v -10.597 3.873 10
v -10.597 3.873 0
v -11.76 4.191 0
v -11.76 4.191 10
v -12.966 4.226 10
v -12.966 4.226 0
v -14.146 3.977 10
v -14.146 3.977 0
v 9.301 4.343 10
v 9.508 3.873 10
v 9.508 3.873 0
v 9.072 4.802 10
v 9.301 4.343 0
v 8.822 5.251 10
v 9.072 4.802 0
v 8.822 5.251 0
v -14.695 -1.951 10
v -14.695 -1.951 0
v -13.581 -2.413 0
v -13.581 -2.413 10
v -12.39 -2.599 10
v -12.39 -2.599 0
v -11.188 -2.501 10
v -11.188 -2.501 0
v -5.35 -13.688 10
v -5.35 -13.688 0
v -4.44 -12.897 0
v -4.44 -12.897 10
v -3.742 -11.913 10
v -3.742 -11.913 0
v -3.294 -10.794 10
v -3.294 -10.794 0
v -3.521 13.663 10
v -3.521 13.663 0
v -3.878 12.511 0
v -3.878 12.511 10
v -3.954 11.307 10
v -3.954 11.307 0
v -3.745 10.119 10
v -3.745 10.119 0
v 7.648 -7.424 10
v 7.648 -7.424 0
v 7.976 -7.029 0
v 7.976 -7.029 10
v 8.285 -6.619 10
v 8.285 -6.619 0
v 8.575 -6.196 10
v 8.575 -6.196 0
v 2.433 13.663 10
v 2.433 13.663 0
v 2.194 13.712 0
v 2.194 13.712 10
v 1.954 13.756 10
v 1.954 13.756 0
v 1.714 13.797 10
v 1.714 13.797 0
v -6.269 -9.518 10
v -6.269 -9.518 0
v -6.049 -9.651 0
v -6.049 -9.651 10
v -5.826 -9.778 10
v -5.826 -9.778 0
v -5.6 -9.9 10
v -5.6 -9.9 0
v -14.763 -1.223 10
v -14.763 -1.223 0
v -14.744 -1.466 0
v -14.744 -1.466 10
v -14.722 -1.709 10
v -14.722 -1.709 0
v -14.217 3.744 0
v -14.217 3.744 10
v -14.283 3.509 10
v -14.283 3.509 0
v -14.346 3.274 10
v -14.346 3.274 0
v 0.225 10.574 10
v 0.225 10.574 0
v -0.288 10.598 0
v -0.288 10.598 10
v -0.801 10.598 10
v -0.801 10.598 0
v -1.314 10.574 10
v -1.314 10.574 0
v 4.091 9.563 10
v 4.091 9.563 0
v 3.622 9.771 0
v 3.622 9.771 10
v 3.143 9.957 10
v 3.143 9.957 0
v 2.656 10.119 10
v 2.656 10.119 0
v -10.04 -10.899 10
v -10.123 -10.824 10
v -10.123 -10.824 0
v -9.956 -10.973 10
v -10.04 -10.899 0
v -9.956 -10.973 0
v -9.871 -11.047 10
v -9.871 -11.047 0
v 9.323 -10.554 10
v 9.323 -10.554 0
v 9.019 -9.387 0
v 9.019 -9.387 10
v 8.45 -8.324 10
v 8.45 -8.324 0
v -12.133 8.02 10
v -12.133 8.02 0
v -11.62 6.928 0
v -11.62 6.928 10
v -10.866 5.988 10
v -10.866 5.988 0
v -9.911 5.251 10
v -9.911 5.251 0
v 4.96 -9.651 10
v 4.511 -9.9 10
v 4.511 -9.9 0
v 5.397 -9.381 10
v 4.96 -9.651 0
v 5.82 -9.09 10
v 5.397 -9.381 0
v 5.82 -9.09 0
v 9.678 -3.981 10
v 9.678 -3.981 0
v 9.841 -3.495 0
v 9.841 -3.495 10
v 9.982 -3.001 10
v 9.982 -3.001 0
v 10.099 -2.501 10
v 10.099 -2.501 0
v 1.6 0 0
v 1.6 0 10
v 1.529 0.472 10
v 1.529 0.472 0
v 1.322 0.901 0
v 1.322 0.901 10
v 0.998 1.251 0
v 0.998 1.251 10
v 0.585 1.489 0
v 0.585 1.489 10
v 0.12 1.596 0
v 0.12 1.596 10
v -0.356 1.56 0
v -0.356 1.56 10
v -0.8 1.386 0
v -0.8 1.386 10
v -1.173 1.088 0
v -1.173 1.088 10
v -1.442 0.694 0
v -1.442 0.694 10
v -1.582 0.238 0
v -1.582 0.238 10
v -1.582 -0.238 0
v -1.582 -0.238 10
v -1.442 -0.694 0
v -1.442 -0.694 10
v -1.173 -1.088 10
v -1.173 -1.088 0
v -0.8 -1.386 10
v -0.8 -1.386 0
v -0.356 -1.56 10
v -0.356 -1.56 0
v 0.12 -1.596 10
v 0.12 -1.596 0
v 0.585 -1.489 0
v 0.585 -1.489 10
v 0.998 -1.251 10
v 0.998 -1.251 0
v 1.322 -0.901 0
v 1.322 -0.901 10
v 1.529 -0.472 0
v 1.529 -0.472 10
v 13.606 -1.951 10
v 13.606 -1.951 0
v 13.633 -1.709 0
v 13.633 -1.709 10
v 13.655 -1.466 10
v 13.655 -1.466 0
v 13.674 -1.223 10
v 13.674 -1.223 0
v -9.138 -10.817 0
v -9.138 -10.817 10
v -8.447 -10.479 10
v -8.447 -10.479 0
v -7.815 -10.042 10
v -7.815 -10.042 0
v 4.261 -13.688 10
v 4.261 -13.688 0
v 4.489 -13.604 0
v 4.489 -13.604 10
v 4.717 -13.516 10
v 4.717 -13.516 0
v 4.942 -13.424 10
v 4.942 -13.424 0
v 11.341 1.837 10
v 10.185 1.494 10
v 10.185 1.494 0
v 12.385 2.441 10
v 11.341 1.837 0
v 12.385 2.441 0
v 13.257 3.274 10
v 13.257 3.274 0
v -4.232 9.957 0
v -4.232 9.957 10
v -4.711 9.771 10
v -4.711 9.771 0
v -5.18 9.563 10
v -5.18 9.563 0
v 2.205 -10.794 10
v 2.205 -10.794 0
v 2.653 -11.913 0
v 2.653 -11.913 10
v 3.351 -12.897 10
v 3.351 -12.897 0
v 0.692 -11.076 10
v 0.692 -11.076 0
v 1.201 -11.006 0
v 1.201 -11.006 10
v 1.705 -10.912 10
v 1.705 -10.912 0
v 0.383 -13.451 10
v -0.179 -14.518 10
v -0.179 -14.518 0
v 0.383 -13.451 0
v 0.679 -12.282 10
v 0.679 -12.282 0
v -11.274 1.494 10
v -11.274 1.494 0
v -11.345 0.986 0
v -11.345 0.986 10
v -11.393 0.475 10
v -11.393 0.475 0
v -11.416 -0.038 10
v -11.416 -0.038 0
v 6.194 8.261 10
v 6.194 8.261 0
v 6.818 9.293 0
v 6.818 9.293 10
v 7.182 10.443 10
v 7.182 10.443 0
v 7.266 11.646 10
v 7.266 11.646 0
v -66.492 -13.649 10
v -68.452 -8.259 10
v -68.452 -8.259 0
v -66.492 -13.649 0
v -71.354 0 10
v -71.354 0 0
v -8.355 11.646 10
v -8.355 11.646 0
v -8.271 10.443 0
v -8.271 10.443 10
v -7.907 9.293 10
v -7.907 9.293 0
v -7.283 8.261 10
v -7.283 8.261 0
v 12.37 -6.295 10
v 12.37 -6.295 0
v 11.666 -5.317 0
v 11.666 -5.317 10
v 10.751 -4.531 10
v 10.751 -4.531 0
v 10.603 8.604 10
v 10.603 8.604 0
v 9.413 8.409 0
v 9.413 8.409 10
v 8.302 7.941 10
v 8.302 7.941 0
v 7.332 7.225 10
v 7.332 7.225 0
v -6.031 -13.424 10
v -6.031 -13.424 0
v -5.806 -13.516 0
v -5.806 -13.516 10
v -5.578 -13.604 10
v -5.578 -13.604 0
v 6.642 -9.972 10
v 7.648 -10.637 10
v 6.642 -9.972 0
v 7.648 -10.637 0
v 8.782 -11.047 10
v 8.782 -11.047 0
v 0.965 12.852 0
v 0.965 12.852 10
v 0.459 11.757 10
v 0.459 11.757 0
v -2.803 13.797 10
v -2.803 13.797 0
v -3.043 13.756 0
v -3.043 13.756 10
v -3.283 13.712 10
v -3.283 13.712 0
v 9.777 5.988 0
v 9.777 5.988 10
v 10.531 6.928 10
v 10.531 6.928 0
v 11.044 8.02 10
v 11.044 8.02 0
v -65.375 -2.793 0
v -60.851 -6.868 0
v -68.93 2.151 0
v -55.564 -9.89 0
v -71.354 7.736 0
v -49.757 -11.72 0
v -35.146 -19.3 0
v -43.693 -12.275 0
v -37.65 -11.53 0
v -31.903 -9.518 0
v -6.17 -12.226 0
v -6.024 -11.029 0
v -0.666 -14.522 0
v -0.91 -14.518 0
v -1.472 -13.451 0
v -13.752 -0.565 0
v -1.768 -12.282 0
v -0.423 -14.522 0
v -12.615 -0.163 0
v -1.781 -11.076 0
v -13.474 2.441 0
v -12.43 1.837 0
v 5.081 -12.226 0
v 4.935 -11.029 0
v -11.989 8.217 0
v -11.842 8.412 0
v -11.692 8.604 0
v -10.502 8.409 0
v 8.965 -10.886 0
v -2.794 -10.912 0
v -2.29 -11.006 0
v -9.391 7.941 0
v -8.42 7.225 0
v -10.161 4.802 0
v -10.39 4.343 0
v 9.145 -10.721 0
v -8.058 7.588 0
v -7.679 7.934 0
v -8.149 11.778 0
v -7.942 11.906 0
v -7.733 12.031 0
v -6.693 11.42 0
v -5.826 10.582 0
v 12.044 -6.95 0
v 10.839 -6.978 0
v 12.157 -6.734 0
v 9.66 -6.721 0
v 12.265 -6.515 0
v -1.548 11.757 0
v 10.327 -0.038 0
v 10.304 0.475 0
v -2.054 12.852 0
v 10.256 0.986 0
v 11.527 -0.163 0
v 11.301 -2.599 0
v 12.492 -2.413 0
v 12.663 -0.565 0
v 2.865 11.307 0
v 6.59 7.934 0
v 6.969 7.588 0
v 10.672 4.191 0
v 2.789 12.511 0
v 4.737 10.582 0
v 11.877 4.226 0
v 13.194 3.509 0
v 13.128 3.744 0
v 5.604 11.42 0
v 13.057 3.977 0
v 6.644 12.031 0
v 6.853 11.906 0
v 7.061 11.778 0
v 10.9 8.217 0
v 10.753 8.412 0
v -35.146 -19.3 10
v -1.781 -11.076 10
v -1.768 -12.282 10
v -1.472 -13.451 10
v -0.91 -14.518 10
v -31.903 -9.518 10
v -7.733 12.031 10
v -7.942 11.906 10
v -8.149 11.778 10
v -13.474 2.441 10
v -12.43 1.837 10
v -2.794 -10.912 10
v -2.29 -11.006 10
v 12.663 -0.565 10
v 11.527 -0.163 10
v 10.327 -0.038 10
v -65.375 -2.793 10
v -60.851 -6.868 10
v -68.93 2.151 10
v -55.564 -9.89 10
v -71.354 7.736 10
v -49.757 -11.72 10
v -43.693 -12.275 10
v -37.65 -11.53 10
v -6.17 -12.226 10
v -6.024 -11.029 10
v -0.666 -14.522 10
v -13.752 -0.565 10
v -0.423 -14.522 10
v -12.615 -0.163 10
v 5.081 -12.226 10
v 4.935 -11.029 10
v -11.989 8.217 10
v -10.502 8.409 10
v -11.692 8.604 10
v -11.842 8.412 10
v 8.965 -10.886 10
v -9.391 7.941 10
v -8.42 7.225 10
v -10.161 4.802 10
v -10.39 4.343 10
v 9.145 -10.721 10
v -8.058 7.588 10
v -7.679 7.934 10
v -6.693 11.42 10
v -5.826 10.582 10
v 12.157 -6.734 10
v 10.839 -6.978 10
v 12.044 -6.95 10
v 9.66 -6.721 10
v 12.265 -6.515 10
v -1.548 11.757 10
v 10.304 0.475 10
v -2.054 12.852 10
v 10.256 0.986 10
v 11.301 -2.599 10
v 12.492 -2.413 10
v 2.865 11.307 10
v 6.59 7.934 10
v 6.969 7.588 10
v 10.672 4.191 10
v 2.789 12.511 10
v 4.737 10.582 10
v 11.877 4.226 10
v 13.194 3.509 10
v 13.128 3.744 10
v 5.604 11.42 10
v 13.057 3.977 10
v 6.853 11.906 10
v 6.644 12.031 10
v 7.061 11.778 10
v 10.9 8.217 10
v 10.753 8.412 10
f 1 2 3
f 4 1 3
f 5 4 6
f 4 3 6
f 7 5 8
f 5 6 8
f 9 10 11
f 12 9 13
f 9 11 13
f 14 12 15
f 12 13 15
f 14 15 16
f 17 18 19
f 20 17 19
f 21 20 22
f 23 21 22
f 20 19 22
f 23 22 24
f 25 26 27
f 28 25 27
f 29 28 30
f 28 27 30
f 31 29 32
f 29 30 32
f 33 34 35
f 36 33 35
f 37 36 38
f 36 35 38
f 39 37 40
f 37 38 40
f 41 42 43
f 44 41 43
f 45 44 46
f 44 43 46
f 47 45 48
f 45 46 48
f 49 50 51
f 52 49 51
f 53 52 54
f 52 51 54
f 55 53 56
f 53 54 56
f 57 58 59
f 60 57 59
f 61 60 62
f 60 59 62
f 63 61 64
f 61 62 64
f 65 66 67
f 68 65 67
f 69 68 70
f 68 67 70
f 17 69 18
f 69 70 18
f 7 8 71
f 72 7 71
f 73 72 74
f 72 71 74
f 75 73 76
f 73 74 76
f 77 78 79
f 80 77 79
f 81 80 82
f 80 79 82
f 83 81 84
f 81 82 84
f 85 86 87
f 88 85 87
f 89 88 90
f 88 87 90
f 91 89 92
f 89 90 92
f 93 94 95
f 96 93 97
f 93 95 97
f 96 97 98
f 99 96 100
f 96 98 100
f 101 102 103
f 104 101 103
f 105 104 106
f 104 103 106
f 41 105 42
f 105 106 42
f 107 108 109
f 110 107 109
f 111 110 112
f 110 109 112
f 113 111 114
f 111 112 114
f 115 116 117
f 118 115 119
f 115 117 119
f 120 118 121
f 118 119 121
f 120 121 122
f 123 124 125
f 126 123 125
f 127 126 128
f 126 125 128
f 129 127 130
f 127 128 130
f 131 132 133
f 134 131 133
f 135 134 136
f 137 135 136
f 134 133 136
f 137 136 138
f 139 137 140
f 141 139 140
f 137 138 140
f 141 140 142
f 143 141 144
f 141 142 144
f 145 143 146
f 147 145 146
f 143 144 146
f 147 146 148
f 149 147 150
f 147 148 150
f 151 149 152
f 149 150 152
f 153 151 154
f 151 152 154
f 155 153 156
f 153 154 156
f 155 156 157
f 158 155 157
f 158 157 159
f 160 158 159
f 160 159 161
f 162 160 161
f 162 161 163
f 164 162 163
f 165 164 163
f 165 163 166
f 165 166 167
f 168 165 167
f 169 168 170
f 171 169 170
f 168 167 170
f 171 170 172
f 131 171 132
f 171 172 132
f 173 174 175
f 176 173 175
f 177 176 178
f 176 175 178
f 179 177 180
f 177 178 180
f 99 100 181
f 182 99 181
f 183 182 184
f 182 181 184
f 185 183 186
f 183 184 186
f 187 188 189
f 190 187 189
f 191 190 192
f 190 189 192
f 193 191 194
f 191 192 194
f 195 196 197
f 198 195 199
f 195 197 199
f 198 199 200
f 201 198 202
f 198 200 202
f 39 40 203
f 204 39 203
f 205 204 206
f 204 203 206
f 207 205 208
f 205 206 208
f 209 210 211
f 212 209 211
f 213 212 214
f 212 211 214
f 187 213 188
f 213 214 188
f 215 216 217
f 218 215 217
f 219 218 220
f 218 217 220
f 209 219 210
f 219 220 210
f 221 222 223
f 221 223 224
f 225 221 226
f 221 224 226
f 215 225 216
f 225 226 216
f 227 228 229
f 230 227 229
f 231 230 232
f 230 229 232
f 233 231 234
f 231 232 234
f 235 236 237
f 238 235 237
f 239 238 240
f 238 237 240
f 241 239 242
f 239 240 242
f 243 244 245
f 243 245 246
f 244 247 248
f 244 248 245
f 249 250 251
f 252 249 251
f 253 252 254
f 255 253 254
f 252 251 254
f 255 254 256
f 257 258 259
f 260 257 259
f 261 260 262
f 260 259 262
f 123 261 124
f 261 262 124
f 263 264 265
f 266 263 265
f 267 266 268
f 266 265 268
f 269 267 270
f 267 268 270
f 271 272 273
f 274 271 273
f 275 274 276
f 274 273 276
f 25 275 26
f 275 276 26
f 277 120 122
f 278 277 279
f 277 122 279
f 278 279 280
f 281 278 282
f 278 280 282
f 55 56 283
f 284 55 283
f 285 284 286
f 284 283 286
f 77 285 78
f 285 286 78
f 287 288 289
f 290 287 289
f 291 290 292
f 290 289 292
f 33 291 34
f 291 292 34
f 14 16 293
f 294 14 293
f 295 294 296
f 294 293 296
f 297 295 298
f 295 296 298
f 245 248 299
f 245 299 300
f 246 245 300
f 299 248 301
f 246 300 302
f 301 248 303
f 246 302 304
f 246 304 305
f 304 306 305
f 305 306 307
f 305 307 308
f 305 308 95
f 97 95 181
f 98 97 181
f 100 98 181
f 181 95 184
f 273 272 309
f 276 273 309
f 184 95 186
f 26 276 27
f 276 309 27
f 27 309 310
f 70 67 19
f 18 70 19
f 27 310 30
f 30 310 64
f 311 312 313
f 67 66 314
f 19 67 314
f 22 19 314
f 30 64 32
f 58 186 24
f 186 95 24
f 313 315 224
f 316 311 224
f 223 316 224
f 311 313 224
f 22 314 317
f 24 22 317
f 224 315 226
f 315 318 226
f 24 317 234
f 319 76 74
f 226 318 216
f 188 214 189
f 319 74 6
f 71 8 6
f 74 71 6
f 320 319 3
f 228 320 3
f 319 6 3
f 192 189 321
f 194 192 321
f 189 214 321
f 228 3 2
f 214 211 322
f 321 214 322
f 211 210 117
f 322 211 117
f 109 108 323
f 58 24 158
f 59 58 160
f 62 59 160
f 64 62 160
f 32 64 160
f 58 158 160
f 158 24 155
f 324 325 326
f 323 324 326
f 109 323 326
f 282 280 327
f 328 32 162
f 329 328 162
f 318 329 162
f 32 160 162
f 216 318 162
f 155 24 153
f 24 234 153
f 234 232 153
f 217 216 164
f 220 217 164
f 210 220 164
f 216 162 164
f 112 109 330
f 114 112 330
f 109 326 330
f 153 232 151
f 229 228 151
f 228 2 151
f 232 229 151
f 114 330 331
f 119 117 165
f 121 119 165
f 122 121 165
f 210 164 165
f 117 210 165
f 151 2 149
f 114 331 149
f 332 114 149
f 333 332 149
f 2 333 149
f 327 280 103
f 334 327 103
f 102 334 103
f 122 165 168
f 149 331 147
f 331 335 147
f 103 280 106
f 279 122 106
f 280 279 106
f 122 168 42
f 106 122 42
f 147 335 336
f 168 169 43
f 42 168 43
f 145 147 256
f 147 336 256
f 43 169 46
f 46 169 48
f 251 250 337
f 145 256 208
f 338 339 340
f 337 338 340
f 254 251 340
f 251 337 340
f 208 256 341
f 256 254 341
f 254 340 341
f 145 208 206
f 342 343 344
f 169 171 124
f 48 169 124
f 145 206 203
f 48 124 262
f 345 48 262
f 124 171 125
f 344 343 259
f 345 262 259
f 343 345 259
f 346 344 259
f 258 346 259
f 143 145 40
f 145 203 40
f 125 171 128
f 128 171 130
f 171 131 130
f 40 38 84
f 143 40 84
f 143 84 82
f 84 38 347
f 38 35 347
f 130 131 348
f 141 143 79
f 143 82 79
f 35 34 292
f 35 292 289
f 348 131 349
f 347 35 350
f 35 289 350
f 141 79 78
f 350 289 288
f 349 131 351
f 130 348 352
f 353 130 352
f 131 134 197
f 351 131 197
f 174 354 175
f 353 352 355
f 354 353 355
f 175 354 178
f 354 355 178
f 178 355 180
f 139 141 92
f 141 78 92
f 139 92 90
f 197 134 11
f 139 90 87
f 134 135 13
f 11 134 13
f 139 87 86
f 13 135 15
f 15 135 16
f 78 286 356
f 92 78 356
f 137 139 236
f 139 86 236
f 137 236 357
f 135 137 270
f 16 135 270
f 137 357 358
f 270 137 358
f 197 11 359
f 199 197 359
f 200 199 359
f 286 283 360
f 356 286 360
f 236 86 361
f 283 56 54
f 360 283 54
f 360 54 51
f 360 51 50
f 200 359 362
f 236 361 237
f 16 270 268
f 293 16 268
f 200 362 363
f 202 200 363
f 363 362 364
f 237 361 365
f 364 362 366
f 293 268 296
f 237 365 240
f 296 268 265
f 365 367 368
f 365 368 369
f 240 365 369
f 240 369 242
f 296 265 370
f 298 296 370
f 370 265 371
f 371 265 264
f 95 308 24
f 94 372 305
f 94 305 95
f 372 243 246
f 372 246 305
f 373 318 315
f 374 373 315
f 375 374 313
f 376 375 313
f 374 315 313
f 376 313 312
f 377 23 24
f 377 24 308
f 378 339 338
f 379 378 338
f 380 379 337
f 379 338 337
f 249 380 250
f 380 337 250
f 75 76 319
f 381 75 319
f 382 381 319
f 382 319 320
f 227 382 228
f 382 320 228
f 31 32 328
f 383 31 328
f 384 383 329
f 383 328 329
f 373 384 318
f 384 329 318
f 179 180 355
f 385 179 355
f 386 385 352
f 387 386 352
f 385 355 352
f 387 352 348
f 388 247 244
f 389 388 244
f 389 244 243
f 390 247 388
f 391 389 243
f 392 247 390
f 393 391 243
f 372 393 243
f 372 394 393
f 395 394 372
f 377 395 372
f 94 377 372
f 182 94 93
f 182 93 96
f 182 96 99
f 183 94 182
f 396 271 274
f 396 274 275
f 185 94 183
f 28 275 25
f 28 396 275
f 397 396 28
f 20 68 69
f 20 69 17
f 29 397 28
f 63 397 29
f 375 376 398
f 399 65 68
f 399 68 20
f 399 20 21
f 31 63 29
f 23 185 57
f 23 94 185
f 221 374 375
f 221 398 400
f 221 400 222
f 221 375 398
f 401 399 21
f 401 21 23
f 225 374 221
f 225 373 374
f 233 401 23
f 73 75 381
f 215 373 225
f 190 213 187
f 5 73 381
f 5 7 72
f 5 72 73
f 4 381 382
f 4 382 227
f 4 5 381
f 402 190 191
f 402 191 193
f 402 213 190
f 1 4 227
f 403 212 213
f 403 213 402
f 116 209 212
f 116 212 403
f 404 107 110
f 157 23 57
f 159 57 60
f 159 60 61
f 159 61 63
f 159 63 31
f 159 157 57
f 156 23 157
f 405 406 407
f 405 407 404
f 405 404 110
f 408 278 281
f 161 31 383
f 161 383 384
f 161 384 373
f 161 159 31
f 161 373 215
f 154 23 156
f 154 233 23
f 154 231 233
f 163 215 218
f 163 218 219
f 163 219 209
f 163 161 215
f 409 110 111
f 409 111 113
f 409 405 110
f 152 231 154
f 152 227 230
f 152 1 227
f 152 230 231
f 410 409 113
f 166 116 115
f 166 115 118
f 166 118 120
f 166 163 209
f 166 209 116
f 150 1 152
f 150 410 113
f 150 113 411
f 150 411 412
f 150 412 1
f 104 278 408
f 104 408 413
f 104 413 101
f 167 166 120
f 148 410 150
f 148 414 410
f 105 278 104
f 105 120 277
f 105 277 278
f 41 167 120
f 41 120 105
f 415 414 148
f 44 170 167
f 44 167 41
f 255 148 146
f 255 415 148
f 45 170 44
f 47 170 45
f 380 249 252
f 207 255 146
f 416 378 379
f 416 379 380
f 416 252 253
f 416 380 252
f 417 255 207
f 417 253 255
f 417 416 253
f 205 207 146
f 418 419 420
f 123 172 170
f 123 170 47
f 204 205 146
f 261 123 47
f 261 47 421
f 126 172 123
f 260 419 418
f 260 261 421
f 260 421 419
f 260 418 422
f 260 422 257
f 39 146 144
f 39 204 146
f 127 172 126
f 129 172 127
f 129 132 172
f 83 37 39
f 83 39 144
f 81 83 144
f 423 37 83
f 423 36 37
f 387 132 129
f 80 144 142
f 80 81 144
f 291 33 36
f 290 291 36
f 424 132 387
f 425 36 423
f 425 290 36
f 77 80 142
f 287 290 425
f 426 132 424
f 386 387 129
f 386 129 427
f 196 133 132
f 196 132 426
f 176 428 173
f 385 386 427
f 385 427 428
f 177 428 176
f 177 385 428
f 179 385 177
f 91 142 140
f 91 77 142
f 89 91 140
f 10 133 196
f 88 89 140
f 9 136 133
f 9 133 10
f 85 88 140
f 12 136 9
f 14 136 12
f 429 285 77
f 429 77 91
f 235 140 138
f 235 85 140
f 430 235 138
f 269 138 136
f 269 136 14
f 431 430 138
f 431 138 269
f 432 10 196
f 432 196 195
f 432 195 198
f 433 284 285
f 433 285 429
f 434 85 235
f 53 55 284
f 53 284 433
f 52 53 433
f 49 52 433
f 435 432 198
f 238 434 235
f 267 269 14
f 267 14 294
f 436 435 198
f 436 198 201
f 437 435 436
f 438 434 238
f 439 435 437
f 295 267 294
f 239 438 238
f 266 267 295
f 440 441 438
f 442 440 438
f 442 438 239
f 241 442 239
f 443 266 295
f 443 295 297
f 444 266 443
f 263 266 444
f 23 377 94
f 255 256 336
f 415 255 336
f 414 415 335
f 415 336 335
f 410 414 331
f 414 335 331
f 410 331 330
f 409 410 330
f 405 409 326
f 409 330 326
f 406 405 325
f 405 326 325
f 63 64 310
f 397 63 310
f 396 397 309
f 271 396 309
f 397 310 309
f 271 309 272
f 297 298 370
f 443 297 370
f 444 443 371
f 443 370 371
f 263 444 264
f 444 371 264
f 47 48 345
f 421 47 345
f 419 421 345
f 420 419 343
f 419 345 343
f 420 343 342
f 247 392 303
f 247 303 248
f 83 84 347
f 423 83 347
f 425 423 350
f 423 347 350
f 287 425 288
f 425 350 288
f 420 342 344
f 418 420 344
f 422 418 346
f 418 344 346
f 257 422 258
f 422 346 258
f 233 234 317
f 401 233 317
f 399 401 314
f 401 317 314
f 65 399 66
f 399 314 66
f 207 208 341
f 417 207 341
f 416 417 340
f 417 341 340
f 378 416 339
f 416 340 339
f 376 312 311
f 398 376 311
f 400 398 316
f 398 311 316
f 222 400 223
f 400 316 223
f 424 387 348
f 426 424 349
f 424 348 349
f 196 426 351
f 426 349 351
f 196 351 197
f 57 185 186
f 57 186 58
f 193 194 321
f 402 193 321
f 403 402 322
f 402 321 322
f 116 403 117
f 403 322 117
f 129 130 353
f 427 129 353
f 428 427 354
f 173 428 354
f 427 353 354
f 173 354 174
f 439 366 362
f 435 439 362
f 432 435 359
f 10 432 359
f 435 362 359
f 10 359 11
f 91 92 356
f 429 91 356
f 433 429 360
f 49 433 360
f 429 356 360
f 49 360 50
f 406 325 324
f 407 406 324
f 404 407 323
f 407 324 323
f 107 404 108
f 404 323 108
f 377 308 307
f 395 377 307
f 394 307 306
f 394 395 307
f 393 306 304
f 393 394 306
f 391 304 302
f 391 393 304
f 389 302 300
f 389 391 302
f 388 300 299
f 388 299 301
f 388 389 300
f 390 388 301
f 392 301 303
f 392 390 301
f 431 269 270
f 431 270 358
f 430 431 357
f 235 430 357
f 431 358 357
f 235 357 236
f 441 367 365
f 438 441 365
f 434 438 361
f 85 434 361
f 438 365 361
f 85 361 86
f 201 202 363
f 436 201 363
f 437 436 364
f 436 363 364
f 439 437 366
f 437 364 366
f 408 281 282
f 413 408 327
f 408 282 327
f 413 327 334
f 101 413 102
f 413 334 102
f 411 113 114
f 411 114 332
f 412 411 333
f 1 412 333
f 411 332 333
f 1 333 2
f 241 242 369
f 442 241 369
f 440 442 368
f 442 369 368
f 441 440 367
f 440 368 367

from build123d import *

# Parameters (mm, degrees)
EXTRUDE_1_DEPTH     = 10
SKETCH_2_R          = 1.6
CUT_EXTRUDE_1_DEPTH = 10
EXTRUDE_2_DEPTH     = 10


with BuildPart() as part:
    # 草图1 → 凸台-拉伸1 (new body)
    with BuildSketch(Plane.XY):
        with BuildLine():
            ThreePointArc((-14.346020253, 3.273810573), (-12.969870434, 2.10791515), (-11.273952779, 1.493941396))
            ThreePointArc((-11.273952779, 1.493941396), (-11.372074296, 0.730383496), (-11.41592688, -0.03820316))
            ThreePointArc((-11.41592688, -0.03820316), (-13.195785695, -0.330098793), (-14.762736671, -1.223275765))
            ThreePointArc((-14.762736671, -1.223275765), (-14.733672875, -1.587766767), (-14.695266759, -1.951392075))
            ThreePointArc((-14.695266759, -1.951392075), (-12.990875263, -2.541434526), (-11.187686245, -2.501311882))
            ThreePointArc((-11.187686245, -2.501311882), (-11.003352906, -3.248753999), (-10.766598699, -3.981281092))
            ThreePointArc((-10.766598699, -3.981281092), (-12.320822752, -4.896424828), (-13.459308284, -6.295335531))
            ThreePointArc((-13.459308284, -6.295335531), (-13.300537764, -6.624714214), (-13.133368515, -6.949910827))
            ThreePointArc((-13.133368515, -6.949910827), (-11.33092286, -6.884411803), (-9.663993147, -6.195611546))
            ThreePointArc((-9.663993147, -6.195611546), (-9.222100192, -6.825991681), (-8.736714161, -7.423527369))
            ThreePointArc((-8.736714161, -7.423527369), (-9.855396881, -8.838323974), (-10.411658189, -10.554037767))
            ThreePointArc((-10.411658189, -10.554037767), (-10.144623785, -10.803819715), (-9.871268536, -11.046668027))
            ThreePointArc((-9.871268536, -11.046668027), (-8.214198994, -10.334473534), (-6.908656681, -9.090021956))
            ThreePointArc((-6.908656681, -9.090021956), (-6.268884202, -9.518203778), (-5.600420419, -9.900047555))
            ThreePointArc((-5.600420419, -9.900047555), (-6.132477506, -11.62342091), (-6.031388419, -13.424221137))
            ThreePointArc((-6.031388419, -13.424221137), (-5.692154606, -13.560671914), (-5.349531499, -13.688373915))
            ThreePointArc((-5.349531499, -13.688373915), (-4.061634494, -12.425669766), (-3.293800304, -10.793636948))
            ThreePointArc((-3.293800304, -10.793636948), (-2.542553119, -10.96179213), (-1.781291324, -11.076373878))
            ThreePointArc((-1.781291324, -11.076373878), (-1.65486552, -12.87557286), (-0.910078679, -14.518251473))
            ThreePointArc((-0.910078679, -14.518251473), (-0.544460863, -14.522942645), (-0.178843046, -14.518251473))
            ThreePointArc((-0.178843046, -14.518251473), (0.565943794, -12.87557286), (0.692369599, -11.076373878))
            ThreePointArc((0.692369599, -11.076373878), (1.453631394, -10.96179213), (2.204878579, -10.793636948))
            ThreePointArc((2.204878579, -10.793636948), (2.972712769, -12.425669766), (4.260609774, -13.688373915))
            ThreePointArc((4.260609774, -13.688373915), (4.603232881, -13.560671914), (4.942466694, -13.424221137))
            ThreePointArc((4.942466694, -13.424221137), (5.043555781, -11.62342091), (4.511498694, -9.900047555))
            ThreePointArc((4.511498694, -9.900047555), (5.179962477, -9.518203778), (5.819734956, -9.090021956))
            ThreePointArc((5.819734956, -9.090021956), (7.125277269, -10.334473534), (8.782346811, -11.046668027))
            ThreePointArc((8.782346811, -11.046668027), (9.055702059, -10.803819715), (9.322736464, -10.554037767))
            ThreePointArc((9.322736464, -10.554037767), (8.766475155, -8.838323974), (7.647792436, -7.423527369))
            ThreePointArc((7.647792436, -7.423527369), (8.133178467, -6.825991681), (8.575071422, -6.195611546))
            ThreePointArc((8.575071422, -6.195611546), (10.242001135, -6.884411803), (12.04444679, -6.949910827))
            ThreePointArc((12.04444679, -6.949910827), (12.211616039, -6.624714214), (12.370386559, -6.295335531))
            ThreePointArc((12.370386559, -6.295335531), (11.231901027, -4.896424828), (9.677676974, -3.981281092))
            ThreePointArc((9.677676974, -3.981281092), (9.914431181, -3.248753999), (10.09876452, -2.501311882))
            ThreePointArc((10.09876452, -2.501311882), (11.901953538, -2.541434526), (13.606345034, -1.951392075))
            ThreePointArc((13.606345034, -1.951392075), (13.64475115, -1.587766767), (13.673814946, -1.223275765))
            ThreePointArc((13.673814946, -1.223275765), (12.10686397, -0.330098793), (10.327005155, -0.03820316))
            ThreePointArc((10.327005155, -0.03820316), (10.28315257, 0.730383496), (10.185031054, 1.493941396))
            ThreePointArc((10.185031054, 1.493941396), (11.880948709, 2.10791515), (13.257098528, 3.273810573))
            ThreePointArc((13.257098528, 3.273810573), (13.161554553, 3.626754964), (13.056986399, 3.977131755))
            ThreePointArc((13.056986399, 3.977131755), (11.273195392, 4.243946496), (9.50808161, 3.873171904))
            ThreePointArc((9.50808161, 3.873171904), (9.189544768, 4.574016236), (8.822220251, 5.250567193))
            ThreePointArc((8.822220251, 5.250567193), (10.181823465, 6.435716787), (11.04387495, 8.020004545))
            ThreePointArc((11.04387495, 8.020004545), (10.827284626, 8.314600924), (10.603207031, 8.603543177))
            ThreePointArc((10.603207031, 8.603543177), (8.843486852, 8.207960878), (7.3315065, 7.224591224))
            ThreePointArc((7.3315065, 7.224591224), (6.781305566, 7.763040321), (6.19438726, 8.26121238))
            ThreePointArc((6.19438726, 8.26121238), (7.034054087, 9.857476795), (7.265582407, 11.646190047))
            ThreePointArc((7.265582407, 11.646190047), (6.957197458, 11.84265154), (6.643873342, 12.031136003))
            ThreePointArc((6.643873342, 12.031136003), (5.145883953, 11.026582245), (4.091238356, 9.563427049))
            ThreePointArc((4.091238356, 9.563427049), (3.383681016, 9.866760378), (2.65643549, 10.119272641))
            ThreePointArc((2.65643549, 10.119272641), (2.86276427, 11.911067522), (2.432500244, 13.662630633))
            ThreePointArc((2.432500244, 13.662630633), (2.073969766, 13.734424026), (1.713715288, 13.796994828))
            ThreePointArc((1.713715288, 13.796994828), (0.679768455, 12.319140163), (0.224893345, 10.573806643))
            ThreePointArc((0.224893345, 10.573806643), (-0.544460863, 10.601057355), (-1.31381507, 10.573806643))
            ThreePointArc((-1.31381507, 10.573806643), (-1.76869018, 12.319140163), (-2.802637013, 13.796994828))
            ThreePointArc((-2.802637013, 13.796994828), (-3.162891491, 13.734424026), (-3.521421969, 13.662630633))
            ThreePointArc((-3.521421969, 13.662630633), (-3.951685995, 11.911067522), (-3.745357215, 10.119272641))
            ThreePointArc((-3.745357215, 10.119272641), (-4.472602741, 9.866760378), (-5.180160081, 9.563427049))
            ThreePointArc((-5.180160081, 9.563427049), (-6.234805678, 11.026582245), (-7.732795067, 12.031136003))
            ThreePointArc((-7.732795067, 12.031136003), (-8.046119184, 11.84265154), (-8.354504132, 11.646190047))
            ThreePointArc((-8.354504132, 11.646190047), (-8.122975812, 9.857476795), (-7.283308985, 8.26121238))
            ThreePointArc((-7.283308985, 8.26121238), (-7.870227292, 7.763040321), (-8.420428225, 7.224591224))
            ThreePointArc((-8.420428225, 7.224591224), (-9.932408577, 8.207960878), (-11.692128756, 8.603543177))
            ThreePointArc((-11.692128756, 8.603543177), (-11.916206351, 8.314600924), (-12.132796675, 8.020004545))
            ThreePointArc((-12.132796675, 8.020004545), (-11.27074519, 6.435716787), (-9.911141976, 5.250567193))
            ThreePointArc((-9.911141976, 5.250567193), (-10.278466493, 4.574016236), (-10.597003335, 3.873171904))
            ThreePointArc((-10.597003335, 3.873171904), (-12.362117117, 4.243946496), (-14.145908124, 3.977131755))
            ThreePointArc((-14.145908124, 3.977131755), (-14.250476278, 3.626754964), (-14.346020253, 3.273810573))
        make_face()
    extrude(amount=EXTRUDE_1_DEPTH)

    # 草图2 → 切除-拉伸1 (cut)
    with BuildSketch(Plane.XY.offset(10)):
        Circle(SKETCH_2_R)
    extrude(amount=-CUT_EXTRUDE_1_DEPTH, mode=Mode.SUBTRACT)

    # 草图3 → 凸台-拉伸2 (add)
    with BuildSketch(Plane.XY.offset(10)):
        with BuildLine():
            Line((-35.145602395, -19.299750751), (-6.268884202, -9.518203778))
            Line((-6.268884202, -9.518203778), (-11.187686245, -2.501311882))
            Line((-11.187686245, -2.501311882), (-31.902692825, -9.518203778))
            ThreePointArc((-31.902692825, -9.518203778), (-55.564328736, -9.890192083), (-71.354077075, 7.736357117))
            Line((-71.354077075, 7.736357117), (-71.354077075, 0))
            Line((-71.354077075, 0), (-68.451868042, -8.25925779))
            Line((-68.451868042, -8.25925779), (-66.492126744, -13.648546361))
            Line((-66.492126744, -13.648546361), (-35.145602395, -19.299750751))
        make_face()
    extrude(amount=-EXTRUDE_2_DEPTH)


solid = part.part
